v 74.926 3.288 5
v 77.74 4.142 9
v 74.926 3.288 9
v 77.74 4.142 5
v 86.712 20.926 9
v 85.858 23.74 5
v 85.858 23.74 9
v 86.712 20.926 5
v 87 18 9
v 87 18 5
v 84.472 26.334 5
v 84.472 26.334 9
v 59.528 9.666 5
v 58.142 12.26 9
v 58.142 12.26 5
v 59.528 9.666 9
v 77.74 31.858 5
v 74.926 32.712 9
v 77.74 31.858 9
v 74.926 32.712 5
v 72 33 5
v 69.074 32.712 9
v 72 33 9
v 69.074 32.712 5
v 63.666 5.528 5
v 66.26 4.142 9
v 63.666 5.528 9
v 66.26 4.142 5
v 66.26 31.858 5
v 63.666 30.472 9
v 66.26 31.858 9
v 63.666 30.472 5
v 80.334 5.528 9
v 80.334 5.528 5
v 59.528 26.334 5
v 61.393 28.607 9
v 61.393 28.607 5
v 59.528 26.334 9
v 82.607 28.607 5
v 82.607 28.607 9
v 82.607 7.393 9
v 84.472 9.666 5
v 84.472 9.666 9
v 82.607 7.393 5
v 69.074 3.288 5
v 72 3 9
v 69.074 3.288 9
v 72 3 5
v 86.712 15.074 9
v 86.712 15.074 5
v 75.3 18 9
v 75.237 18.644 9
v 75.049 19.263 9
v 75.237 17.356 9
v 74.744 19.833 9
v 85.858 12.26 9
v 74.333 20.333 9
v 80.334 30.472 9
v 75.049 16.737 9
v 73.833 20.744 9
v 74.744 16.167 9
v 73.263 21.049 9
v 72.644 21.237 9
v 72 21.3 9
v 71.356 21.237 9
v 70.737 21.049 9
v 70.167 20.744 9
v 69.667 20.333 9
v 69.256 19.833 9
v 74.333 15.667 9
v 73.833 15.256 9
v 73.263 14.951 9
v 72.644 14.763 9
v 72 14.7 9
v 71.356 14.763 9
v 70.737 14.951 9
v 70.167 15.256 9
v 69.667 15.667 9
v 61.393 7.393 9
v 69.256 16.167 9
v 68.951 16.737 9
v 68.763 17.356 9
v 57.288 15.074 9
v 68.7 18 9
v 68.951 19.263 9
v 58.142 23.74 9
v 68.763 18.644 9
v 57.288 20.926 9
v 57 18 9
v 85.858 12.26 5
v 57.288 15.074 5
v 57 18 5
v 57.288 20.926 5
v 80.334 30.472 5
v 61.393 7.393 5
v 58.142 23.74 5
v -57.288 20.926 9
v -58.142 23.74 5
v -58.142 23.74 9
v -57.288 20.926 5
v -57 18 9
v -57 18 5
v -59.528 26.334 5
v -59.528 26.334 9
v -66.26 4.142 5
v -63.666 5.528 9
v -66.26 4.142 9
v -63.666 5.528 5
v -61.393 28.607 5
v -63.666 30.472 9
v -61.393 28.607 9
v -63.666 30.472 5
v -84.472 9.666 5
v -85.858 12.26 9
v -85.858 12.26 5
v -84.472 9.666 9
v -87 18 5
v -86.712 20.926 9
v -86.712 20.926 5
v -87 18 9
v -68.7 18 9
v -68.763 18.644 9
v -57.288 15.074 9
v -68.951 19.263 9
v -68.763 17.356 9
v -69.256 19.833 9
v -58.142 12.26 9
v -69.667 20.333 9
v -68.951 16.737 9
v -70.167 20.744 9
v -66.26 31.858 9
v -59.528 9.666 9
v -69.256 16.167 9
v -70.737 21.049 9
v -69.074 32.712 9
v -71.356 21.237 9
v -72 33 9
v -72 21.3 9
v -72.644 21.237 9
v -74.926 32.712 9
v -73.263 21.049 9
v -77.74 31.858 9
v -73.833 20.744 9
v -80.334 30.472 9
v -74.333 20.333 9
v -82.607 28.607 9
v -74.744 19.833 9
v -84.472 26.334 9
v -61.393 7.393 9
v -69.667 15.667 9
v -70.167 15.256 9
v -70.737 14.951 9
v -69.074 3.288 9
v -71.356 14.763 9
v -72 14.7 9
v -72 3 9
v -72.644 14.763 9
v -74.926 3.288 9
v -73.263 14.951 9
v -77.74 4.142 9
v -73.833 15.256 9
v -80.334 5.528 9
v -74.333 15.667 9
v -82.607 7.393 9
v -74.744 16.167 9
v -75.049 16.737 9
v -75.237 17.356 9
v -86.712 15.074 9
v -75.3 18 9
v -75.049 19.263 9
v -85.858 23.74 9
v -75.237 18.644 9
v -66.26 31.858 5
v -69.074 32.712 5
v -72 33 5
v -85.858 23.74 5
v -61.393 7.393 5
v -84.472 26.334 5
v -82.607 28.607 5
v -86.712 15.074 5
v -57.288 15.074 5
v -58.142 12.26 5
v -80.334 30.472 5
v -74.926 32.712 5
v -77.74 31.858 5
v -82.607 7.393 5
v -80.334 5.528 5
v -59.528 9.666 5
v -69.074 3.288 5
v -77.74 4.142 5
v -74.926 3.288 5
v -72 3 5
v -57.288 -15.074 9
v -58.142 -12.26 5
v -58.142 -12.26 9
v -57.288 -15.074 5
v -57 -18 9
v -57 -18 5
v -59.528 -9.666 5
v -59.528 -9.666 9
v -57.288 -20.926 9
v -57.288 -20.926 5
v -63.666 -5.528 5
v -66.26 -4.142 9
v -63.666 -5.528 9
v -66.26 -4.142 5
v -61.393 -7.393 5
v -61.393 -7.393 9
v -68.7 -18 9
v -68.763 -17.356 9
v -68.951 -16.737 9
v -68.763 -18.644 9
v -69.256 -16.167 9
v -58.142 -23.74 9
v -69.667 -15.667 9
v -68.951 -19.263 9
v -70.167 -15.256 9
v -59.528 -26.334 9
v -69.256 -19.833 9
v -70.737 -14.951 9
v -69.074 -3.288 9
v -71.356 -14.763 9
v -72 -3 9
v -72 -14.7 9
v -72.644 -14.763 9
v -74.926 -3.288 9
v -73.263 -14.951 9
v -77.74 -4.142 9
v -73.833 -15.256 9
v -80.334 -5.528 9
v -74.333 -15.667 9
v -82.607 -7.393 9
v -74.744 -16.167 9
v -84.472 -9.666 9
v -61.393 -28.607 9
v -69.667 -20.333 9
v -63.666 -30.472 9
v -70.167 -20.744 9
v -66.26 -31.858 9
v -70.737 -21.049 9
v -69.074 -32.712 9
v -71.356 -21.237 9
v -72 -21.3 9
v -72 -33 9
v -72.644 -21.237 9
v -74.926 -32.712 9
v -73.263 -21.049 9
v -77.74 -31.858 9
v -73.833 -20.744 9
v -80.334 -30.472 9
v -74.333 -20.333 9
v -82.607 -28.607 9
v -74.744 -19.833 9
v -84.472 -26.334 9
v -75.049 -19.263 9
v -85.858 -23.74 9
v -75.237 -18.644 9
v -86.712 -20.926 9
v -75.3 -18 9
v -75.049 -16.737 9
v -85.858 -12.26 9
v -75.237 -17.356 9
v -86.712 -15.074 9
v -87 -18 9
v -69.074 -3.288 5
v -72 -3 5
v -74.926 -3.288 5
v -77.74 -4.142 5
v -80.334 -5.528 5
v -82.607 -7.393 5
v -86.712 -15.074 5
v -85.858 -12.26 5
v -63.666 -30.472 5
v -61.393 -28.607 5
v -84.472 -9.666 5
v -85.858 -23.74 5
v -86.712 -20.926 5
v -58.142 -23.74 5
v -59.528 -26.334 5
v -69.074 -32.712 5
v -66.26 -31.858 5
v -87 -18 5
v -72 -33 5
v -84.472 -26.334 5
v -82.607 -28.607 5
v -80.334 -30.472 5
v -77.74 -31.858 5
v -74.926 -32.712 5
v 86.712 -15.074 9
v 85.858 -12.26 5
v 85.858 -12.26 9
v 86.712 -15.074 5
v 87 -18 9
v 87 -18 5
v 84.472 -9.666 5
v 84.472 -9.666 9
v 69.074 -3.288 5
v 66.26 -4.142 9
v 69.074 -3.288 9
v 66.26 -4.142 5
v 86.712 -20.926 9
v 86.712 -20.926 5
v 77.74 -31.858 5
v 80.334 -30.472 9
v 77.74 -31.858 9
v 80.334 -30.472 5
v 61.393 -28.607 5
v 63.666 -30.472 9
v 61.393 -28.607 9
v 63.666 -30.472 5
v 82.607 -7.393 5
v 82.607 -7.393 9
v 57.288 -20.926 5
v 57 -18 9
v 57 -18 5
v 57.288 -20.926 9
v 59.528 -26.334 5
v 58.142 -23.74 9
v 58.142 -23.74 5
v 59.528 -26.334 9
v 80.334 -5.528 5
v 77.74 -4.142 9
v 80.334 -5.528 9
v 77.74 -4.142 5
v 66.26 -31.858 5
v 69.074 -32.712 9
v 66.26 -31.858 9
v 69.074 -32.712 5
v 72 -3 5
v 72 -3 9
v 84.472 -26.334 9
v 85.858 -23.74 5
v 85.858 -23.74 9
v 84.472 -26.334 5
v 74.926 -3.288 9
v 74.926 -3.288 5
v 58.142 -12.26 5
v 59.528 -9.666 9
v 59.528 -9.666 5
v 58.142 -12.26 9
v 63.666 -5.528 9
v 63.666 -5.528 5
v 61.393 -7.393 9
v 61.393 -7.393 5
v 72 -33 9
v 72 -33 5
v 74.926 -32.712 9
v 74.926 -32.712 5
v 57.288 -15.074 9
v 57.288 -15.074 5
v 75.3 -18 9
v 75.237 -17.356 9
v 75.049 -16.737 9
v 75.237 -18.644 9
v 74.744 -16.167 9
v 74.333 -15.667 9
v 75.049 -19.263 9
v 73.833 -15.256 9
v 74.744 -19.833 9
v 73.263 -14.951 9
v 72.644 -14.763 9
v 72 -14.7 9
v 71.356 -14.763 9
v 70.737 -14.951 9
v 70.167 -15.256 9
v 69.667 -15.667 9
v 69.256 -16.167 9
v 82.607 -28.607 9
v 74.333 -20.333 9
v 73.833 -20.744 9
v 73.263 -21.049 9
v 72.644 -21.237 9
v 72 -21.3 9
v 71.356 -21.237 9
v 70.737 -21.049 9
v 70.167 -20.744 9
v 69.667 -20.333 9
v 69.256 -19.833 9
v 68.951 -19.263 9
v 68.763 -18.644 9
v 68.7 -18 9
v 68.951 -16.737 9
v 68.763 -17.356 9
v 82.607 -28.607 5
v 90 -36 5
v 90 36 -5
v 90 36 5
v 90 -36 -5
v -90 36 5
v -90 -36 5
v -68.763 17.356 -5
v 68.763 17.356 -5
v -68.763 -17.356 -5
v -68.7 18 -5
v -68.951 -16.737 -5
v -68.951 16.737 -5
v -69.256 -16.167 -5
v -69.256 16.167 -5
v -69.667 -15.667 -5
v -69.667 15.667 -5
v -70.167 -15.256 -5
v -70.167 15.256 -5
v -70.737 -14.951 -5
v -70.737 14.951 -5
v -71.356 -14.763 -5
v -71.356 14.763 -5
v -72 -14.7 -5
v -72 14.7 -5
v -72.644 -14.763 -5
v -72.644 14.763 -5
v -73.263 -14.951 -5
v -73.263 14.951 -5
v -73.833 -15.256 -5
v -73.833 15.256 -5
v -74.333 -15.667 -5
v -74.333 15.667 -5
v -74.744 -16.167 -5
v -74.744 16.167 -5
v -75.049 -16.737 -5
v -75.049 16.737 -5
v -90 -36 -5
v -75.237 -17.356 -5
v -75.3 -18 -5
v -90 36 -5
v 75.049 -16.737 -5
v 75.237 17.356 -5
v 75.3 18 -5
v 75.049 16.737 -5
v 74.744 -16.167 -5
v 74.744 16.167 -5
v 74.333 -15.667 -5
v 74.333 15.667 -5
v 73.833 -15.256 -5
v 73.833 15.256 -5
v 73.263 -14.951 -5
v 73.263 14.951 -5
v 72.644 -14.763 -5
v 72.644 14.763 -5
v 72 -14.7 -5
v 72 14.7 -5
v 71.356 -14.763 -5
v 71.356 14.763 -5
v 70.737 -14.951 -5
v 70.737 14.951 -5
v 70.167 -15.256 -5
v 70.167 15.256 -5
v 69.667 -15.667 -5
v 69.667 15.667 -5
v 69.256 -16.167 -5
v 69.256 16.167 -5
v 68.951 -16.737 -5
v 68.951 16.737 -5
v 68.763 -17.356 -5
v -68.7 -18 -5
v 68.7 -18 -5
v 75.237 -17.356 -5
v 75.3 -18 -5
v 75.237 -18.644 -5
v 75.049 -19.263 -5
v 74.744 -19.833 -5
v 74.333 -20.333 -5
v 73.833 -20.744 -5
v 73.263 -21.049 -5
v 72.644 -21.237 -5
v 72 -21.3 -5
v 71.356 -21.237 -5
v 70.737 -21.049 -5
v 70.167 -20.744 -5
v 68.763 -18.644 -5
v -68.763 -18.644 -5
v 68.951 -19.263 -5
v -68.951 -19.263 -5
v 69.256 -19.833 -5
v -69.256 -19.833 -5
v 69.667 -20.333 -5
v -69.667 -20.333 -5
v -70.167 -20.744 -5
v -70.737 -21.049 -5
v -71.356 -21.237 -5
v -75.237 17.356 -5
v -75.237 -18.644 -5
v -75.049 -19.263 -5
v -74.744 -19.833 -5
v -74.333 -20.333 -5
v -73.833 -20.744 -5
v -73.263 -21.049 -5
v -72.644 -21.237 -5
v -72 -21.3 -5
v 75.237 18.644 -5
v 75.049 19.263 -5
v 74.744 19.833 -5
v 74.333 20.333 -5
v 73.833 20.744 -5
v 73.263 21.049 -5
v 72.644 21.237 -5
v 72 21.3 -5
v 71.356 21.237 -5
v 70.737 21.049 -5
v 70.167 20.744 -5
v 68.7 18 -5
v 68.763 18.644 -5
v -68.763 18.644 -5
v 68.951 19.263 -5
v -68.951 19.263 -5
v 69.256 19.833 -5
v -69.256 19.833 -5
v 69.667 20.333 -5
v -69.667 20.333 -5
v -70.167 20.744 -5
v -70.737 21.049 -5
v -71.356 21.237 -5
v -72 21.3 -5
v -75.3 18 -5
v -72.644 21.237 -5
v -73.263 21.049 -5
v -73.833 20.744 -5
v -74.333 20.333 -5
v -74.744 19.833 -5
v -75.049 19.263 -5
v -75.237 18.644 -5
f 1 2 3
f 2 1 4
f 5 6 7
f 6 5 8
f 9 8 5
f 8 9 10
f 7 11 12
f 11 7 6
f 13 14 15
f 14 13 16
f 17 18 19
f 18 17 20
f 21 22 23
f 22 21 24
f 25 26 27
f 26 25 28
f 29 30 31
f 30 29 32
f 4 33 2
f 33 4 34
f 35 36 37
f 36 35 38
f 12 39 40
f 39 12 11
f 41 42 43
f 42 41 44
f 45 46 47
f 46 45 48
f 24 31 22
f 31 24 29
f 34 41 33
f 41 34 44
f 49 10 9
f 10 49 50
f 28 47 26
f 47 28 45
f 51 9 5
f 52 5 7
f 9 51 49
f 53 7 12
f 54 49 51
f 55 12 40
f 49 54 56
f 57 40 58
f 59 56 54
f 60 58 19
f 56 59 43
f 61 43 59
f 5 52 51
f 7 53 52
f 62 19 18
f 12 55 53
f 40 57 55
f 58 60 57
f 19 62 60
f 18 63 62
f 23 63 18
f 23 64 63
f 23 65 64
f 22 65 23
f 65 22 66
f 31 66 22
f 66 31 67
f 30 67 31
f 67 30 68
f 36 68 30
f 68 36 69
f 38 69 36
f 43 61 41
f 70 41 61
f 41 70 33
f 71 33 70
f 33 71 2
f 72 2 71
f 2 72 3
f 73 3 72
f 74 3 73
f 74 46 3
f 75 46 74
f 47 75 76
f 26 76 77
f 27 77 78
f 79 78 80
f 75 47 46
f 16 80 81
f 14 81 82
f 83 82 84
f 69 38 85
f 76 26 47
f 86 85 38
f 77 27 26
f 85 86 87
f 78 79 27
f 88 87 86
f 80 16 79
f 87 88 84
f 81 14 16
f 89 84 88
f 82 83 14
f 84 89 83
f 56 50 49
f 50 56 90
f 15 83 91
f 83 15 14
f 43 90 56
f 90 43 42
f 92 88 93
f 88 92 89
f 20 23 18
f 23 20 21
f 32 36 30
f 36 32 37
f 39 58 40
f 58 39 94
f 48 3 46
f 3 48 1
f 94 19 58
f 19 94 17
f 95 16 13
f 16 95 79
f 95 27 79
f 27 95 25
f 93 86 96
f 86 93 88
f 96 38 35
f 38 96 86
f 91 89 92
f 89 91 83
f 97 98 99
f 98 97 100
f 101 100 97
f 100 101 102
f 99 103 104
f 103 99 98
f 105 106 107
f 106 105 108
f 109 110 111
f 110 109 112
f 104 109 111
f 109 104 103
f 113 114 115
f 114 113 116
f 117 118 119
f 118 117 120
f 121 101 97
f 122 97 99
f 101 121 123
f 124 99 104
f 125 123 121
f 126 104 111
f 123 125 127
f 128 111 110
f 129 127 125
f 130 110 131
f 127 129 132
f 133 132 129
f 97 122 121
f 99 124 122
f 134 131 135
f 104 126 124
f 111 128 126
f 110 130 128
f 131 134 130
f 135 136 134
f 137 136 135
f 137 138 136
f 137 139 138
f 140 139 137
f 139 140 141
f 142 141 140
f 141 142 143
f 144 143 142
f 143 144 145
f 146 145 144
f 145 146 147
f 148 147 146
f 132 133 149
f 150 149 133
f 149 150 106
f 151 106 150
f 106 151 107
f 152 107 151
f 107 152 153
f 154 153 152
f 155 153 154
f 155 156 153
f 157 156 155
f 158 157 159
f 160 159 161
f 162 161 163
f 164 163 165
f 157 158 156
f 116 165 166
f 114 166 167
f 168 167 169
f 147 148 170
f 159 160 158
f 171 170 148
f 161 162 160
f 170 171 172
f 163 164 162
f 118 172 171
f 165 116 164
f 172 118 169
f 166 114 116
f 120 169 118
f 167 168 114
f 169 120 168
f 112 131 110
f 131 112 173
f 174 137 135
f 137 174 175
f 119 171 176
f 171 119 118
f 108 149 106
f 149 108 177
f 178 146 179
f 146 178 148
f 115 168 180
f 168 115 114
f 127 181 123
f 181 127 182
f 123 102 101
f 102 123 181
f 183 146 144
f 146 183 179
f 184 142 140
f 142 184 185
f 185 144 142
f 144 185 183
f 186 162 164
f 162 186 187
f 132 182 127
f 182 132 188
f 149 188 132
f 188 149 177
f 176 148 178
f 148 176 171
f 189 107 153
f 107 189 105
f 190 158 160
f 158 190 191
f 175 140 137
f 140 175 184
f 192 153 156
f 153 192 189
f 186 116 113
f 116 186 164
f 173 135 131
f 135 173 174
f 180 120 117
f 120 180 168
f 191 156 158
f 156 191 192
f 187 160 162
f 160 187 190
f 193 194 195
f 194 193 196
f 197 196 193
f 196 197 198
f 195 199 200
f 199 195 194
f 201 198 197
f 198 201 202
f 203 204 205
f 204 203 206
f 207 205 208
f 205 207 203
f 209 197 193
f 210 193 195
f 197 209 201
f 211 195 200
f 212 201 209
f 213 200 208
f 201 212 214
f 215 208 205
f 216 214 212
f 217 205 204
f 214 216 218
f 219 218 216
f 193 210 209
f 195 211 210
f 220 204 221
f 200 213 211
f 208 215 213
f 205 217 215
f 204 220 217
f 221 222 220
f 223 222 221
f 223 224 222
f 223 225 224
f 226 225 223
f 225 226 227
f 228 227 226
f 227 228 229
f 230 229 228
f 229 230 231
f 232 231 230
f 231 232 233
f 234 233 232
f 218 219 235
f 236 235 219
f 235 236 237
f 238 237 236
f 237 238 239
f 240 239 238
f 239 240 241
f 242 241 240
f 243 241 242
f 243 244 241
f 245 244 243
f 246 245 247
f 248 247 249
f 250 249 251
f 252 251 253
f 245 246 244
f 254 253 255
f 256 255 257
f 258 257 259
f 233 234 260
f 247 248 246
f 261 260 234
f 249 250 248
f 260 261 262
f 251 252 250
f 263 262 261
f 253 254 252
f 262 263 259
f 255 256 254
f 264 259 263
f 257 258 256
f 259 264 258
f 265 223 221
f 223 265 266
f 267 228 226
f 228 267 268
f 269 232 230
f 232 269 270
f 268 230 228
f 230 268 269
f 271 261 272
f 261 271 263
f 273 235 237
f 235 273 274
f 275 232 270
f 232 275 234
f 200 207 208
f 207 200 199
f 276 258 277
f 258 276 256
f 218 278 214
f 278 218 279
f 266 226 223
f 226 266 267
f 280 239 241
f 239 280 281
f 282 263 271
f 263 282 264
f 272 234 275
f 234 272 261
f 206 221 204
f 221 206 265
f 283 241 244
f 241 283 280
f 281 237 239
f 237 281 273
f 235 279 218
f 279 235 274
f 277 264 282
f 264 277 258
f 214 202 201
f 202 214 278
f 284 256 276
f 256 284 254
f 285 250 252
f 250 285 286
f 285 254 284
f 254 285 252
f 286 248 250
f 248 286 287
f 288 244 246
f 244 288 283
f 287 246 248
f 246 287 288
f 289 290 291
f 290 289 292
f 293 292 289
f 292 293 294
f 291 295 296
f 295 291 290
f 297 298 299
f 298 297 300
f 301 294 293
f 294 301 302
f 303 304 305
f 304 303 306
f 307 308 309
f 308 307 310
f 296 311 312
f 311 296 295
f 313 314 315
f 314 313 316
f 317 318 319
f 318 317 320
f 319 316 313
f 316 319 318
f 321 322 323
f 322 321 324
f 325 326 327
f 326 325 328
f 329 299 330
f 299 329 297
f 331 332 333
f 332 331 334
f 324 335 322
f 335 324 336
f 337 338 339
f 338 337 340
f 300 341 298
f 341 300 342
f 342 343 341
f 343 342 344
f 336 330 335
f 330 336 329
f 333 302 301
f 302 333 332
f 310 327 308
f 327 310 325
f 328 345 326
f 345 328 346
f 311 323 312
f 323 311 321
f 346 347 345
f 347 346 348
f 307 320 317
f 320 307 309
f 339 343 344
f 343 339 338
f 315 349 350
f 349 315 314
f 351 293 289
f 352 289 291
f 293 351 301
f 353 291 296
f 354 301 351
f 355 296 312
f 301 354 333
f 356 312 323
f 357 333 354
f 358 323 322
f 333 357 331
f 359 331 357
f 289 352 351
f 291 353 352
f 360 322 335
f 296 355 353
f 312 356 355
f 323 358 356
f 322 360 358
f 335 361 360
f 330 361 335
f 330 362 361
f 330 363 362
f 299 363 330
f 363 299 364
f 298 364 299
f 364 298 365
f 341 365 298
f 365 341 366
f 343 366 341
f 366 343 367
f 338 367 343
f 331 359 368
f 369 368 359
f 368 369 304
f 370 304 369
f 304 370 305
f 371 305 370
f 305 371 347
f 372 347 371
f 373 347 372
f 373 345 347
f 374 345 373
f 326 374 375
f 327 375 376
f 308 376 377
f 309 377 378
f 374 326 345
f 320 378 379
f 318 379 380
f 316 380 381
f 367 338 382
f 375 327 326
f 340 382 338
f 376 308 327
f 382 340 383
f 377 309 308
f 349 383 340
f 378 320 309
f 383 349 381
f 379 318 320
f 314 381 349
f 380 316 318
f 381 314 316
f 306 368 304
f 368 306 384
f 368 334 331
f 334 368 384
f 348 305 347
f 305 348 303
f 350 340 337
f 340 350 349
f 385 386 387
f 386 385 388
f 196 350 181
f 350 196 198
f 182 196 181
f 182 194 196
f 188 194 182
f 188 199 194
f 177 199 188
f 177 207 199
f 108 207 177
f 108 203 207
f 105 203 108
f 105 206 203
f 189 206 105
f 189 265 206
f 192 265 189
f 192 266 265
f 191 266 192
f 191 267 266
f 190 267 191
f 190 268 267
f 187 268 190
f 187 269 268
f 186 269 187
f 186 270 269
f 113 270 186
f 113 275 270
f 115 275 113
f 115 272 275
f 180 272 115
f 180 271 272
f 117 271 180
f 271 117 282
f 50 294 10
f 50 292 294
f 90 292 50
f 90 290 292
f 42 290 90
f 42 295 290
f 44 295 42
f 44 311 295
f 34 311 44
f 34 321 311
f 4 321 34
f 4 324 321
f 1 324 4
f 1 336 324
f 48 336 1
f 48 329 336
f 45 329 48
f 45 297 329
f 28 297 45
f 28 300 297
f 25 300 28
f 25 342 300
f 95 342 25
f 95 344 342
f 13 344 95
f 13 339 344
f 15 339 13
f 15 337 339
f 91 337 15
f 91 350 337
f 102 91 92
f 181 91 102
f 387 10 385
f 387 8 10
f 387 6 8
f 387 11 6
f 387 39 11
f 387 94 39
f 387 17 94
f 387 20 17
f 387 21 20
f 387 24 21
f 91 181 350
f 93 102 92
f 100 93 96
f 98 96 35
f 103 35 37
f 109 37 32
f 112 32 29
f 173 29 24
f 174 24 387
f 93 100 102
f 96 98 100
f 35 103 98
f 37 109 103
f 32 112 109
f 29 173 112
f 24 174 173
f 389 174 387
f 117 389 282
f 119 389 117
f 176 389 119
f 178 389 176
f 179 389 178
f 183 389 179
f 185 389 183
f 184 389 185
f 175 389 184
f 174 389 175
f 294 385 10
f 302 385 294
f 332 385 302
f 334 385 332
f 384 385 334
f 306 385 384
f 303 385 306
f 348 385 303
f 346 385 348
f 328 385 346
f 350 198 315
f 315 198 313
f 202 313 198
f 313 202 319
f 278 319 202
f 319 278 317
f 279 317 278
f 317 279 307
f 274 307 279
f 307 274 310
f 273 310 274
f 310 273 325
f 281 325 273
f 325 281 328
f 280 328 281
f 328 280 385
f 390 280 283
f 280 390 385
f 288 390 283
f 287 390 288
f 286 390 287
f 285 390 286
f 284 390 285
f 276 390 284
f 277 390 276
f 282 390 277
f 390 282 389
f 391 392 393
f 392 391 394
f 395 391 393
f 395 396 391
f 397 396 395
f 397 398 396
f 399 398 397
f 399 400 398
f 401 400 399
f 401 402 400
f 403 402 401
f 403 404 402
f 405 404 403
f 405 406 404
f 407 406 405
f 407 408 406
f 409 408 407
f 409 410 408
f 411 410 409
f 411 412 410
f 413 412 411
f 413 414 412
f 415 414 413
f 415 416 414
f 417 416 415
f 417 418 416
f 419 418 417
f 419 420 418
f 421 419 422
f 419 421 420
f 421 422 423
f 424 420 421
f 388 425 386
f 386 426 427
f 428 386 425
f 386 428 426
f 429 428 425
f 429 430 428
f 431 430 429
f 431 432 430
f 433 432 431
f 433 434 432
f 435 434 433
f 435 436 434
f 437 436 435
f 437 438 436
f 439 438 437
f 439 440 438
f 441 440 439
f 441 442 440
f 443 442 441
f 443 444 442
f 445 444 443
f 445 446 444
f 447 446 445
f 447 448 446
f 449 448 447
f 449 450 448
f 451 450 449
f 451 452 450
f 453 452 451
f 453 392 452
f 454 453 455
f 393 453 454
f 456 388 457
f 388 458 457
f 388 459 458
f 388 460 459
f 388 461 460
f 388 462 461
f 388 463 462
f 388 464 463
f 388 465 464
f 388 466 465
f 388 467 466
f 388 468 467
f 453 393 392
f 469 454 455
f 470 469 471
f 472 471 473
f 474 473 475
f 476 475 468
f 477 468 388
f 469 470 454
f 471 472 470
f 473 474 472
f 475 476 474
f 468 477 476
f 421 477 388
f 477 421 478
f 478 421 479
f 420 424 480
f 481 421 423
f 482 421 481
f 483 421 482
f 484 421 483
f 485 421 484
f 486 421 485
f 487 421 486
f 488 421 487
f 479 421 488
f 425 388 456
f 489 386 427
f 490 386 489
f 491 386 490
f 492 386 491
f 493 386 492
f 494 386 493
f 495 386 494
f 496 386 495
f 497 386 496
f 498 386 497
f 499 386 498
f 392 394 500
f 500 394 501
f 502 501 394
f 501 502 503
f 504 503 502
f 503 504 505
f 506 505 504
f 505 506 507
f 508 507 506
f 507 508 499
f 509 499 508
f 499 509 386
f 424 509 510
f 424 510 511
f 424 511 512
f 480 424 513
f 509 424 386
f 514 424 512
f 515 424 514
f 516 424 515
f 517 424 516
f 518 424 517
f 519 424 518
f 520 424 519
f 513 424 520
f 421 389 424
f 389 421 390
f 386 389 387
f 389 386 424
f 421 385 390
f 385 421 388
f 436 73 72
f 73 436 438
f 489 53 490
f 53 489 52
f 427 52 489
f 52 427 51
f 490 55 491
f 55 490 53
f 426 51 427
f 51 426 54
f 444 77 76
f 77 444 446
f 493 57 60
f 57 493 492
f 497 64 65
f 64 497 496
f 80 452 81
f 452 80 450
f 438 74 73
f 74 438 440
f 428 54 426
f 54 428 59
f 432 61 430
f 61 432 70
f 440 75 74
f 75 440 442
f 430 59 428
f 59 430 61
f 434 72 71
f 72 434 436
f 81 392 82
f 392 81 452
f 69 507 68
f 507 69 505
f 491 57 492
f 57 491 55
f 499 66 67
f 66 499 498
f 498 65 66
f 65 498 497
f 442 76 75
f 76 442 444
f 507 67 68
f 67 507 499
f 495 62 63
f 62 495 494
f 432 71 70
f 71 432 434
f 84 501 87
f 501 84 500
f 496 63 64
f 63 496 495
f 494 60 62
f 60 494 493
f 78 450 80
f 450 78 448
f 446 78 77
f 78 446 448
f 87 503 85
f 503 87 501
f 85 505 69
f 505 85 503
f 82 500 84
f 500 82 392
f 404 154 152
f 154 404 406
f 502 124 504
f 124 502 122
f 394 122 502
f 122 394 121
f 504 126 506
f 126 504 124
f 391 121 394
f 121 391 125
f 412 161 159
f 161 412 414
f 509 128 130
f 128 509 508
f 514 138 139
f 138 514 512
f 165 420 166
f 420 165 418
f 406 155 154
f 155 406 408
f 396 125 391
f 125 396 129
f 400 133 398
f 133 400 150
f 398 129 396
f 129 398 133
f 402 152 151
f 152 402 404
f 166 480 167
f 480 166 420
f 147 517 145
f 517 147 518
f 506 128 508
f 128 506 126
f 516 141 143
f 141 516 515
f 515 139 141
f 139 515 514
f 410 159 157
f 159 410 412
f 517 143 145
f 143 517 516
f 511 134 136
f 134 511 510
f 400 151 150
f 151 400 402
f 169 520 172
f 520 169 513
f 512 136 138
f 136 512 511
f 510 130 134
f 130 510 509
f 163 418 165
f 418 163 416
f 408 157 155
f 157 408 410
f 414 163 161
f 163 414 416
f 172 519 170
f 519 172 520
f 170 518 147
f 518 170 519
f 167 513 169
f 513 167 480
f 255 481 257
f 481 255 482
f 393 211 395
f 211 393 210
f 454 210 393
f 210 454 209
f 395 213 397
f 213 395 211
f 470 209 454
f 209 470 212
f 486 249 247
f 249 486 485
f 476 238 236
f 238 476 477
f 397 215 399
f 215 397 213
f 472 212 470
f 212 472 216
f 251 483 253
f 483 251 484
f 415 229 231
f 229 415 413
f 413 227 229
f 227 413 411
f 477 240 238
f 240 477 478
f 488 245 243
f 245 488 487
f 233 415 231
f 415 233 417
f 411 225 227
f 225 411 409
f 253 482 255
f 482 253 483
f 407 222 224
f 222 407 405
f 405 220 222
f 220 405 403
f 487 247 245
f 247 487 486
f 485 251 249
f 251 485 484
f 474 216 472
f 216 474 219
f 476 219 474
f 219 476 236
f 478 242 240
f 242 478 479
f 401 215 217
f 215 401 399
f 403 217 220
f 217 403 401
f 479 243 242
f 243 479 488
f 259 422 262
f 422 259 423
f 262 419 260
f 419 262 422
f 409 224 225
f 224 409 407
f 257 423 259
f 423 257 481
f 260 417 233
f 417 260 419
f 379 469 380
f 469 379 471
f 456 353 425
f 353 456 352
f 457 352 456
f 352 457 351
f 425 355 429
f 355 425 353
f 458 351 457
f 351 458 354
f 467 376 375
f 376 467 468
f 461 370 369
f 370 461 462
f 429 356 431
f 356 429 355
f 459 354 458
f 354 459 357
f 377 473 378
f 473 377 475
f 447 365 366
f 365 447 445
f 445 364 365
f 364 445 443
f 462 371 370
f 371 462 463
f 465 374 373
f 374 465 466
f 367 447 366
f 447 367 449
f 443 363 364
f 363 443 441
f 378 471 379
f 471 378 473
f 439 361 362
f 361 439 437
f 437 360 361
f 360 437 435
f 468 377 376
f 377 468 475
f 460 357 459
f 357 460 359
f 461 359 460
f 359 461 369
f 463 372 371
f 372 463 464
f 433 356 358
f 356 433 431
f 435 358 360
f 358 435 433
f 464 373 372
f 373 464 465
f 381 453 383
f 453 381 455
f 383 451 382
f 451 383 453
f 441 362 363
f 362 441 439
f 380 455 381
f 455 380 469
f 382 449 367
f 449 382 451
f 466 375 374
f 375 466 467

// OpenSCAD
$fn = 32;

// ----------------------------------------------------------------------
// Anchor pads 180 x 72 x 14
// four corner bosses with anchor holes
// ----------------------------------------------------------------------

// --- parameters (mm) ---
plate = [180, 72, 10];  // base plate size (x, y, z)
pads = 4;               // boss count, one per corner
edge = 18;              // boss centre offset from the plate edge
boss_d = 30;            // boss diameter
boss_h = 4;             // boss height above the base plate
hole_d = 6.6;           // hole diameter

// --- derived feature positions (mm) ---
height = plate[2] + boss_h;      // = 14   overall height of the part
corner_x = plate[0] / 2 - edge;  // = 72   boss centre X
corner_y = plate[1] / 2 - edge;  // = 18   boss centre Y
feature_centers = [
  [corner_x, corner_y],
  [-corner_x, corner_y],
  [-corner_x, -corner_y],
  [corner_x, -corner_y]
];   // boss centres, anchor holes are drilled there

// base plate, four bosses standing on it, anchor holes all the way through
difference() {
  union() {
    cube(plate, center = true);
    for (centre = feature_centers)
      translate([centre[0], centre[1], plate[2] / 2 - 1])
        cylinder(d = boss_d, h = boss_h + 1);
  }
  for (centre = feature_centers)
    translate([centre[0], centre[1], -height])
      cylinder(d = hole_d, h = 2 * height + 2);  // through boss and plate
}
